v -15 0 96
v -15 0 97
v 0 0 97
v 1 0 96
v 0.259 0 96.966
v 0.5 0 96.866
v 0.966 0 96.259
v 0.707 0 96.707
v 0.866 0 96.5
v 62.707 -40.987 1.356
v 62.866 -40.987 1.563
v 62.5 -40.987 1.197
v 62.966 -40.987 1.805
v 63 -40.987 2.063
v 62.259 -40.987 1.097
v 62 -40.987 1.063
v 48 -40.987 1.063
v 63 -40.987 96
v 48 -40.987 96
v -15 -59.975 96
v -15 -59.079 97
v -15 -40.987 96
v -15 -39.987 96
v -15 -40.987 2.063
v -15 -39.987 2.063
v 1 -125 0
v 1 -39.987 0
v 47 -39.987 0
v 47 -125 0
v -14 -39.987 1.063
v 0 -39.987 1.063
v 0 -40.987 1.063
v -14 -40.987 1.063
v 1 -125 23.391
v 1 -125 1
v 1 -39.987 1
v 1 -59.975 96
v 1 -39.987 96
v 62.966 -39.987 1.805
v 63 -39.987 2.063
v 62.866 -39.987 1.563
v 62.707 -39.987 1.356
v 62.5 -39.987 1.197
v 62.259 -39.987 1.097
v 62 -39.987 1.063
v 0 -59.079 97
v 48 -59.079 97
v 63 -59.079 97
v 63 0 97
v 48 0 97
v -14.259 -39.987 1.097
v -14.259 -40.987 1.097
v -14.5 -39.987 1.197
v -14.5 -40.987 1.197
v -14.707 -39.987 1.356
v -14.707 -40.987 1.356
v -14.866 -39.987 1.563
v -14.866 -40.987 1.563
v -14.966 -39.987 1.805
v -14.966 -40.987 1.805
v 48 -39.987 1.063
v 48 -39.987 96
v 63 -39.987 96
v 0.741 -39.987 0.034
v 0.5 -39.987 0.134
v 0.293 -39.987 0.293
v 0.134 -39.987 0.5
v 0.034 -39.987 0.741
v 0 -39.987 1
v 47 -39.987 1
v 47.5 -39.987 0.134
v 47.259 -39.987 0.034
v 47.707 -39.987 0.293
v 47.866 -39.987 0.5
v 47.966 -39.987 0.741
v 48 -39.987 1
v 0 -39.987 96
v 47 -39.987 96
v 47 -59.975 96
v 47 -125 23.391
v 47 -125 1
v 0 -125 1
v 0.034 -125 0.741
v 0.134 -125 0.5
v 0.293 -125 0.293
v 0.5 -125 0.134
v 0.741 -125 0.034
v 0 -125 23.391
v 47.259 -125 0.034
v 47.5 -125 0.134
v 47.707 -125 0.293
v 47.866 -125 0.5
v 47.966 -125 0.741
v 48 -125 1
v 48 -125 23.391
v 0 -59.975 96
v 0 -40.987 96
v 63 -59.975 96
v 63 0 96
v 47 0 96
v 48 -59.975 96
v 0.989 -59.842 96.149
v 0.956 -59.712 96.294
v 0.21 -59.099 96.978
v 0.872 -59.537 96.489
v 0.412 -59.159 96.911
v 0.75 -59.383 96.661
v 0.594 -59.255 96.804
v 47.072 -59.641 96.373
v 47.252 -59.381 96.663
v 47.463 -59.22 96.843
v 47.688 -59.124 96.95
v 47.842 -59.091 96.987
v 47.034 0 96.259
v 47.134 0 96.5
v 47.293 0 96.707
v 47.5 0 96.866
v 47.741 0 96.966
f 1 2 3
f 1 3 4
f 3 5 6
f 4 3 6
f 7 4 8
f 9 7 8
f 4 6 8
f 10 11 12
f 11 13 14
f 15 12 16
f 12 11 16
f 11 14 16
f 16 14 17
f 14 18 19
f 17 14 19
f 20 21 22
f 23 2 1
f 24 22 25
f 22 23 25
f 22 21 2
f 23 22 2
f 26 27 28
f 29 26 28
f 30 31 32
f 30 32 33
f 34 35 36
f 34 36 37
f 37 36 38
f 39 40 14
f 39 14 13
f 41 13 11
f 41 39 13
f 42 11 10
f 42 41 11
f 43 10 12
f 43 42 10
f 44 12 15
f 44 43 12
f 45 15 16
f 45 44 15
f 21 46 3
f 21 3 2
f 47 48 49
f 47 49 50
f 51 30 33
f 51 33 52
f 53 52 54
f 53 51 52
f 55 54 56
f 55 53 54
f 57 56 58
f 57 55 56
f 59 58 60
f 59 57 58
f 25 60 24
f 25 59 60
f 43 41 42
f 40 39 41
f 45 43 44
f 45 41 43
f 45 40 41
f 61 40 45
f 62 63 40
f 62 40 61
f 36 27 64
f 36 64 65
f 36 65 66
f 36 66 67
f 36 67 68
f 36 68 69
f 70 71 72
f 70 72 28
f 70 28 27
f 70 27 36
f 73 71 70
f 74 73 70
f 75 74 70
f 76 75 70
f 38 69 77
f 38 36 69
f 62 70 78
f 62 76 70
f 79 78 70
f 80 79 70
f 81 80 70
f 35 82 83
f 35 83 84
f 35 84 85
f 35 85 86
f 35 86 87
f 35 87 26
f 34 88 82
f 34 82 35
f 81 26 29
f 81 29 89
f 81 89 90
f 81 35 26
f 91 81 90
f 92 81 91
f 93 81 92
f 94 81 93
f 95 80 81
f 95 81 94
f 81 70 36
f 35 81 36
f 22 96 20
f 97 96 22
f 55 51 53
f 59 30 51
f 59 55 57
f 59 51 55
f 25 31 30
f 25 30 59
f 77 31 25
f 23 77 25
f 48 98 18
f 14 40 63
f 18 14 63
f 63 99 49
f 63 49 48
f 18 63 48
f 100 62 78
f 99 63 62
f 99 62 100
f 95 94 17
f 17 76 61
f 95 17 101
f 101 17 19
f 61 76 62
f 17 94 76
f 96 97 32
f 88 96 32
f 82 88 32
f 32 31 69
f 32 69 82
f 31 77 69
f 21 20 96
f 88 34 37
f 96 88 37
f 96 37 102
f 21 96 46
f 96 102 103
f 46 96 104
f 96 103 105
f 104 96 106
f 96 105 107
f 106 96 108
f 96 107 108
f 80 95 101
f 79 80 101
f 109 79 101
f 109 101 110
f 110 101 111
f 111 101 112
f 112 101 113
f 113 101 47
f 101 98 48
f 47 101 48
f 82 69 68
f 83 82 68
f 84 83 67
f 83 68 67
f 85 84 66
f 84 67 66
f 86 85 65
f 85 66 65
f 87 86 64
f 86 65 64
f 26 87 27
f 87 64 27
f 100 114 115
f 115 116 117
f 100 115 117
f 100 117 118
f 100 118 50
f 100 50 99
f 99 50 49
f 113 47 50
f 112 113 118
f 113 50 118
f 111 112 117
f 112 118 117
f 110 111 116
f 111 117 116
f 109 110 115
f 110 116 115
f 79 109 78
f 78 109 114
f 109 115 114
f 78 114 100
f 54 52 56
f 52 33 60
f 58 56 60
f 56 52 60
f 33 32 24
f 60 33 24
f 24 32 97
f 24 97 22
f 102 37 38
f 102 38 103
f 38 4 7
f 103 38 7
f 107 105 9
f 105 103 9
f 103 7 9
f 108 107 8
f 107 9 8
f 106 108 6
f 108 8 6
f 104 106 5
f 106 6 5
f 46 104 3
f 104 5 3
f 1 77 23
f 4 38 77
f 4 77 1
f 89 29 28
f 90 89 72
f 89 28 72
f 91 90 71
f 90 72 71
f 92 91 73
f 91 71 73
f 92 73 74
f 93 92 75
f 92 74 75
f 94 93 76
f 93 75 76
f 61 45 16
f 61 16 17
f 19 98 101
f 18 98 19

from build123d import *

# Parameters (mm, degrees)
F1_DEPTH      = 125
F2_W          = 45.333487
F2_H          = 99.635656
F3_DEPTH      = 100
F3_DEPTH_BACK = 50
F5_DEPTH      = 1


with BuildPart() as f1:
    # F0 (on Front) → F1 (new body)
    with BuildSketch(Plane.XZ):
        with BuildLine():
            ThreePointArc((0, 1), (0.292893, 0.292893), (1, 0))
            Line((1, 0), (47, 0))
            ThreePointArc((47, 0), (47.707107, 0.292893), (48, 1))
            Line((48, 1), (48, 96))
            Line((48, 96), (63, 96))
            Line((63, 96), (63, 97))
            Line((63, 97), (48, 97))
            ThreePointArc((48, 97), (47.292893, 96.707107), (47, 96))
            Line((47, 96), (47, 1))
            Line((47, 1), (1, 1))
            Line((1, 1), (1, 96))
            ThreePointArc((1, 96), (0.707107, 96.707107), (0, 97))
            Line((0, 97), (-15, 97))
            Line((-15, 97), (-15, 96))
            Line((-15, 96), (0, 96))
            Line((0, 96), (0, 1))
        make_face()
    extrude(amount=F1_DEPTH)

    # F2 (on face) → F3 (cut, two sides)
    with BuildSketch(Plane.YZ.offset(63)) as f3_sk:
        with Locations((-17.320754, 46.182172)):
            Rectangle(F2_W, F2_H)
        Polygon((-139.87067, 100.481688), (-139.87067, 6.786287), (-55.961391, 100.481688), align=None)
    extrude(amount=-F3_DEPTH, mode=Mode.SUBTRACT)
    extrude(f3_sk.sketch, amount=-F3_DEPTH_BACK, mode=Mode.SUBTRACT)

    # F4 (on face) → F5 (join)
    with BuildSketch(Plane(origin=(0, -39.987498, 0), x_dir=(-1, 0, 0), z_dir=(0, 1, 0))):
        with BuildLine():
            Line((-47, 1.063345), (-47, 96))
            Line((-47, 96), (-63, 96))
            Line((-63, 96), (-63, 2.063345))
            ThreePointArc((-63, 2.063345), (-62.707107, 1.356238), (-62, 1.063345))
            Line((-62, 1.063345), (-47, 1.063345))
        make_face()
        with BuildLine():
            Line((15, 2.063345), (15, 96))
            Line((15, 96), (-1, 96))
            Line((-1, 96), (-1, 1.063345))
            Line((-1, 1.063345), (14, 1.063345))
            ThreePointArc((14, 1.063345), (14.707107, 1.356238), (15, 2.063345))
        make_face()
    extrude(amount=-F5_DEPTH)


solid = f1.part
